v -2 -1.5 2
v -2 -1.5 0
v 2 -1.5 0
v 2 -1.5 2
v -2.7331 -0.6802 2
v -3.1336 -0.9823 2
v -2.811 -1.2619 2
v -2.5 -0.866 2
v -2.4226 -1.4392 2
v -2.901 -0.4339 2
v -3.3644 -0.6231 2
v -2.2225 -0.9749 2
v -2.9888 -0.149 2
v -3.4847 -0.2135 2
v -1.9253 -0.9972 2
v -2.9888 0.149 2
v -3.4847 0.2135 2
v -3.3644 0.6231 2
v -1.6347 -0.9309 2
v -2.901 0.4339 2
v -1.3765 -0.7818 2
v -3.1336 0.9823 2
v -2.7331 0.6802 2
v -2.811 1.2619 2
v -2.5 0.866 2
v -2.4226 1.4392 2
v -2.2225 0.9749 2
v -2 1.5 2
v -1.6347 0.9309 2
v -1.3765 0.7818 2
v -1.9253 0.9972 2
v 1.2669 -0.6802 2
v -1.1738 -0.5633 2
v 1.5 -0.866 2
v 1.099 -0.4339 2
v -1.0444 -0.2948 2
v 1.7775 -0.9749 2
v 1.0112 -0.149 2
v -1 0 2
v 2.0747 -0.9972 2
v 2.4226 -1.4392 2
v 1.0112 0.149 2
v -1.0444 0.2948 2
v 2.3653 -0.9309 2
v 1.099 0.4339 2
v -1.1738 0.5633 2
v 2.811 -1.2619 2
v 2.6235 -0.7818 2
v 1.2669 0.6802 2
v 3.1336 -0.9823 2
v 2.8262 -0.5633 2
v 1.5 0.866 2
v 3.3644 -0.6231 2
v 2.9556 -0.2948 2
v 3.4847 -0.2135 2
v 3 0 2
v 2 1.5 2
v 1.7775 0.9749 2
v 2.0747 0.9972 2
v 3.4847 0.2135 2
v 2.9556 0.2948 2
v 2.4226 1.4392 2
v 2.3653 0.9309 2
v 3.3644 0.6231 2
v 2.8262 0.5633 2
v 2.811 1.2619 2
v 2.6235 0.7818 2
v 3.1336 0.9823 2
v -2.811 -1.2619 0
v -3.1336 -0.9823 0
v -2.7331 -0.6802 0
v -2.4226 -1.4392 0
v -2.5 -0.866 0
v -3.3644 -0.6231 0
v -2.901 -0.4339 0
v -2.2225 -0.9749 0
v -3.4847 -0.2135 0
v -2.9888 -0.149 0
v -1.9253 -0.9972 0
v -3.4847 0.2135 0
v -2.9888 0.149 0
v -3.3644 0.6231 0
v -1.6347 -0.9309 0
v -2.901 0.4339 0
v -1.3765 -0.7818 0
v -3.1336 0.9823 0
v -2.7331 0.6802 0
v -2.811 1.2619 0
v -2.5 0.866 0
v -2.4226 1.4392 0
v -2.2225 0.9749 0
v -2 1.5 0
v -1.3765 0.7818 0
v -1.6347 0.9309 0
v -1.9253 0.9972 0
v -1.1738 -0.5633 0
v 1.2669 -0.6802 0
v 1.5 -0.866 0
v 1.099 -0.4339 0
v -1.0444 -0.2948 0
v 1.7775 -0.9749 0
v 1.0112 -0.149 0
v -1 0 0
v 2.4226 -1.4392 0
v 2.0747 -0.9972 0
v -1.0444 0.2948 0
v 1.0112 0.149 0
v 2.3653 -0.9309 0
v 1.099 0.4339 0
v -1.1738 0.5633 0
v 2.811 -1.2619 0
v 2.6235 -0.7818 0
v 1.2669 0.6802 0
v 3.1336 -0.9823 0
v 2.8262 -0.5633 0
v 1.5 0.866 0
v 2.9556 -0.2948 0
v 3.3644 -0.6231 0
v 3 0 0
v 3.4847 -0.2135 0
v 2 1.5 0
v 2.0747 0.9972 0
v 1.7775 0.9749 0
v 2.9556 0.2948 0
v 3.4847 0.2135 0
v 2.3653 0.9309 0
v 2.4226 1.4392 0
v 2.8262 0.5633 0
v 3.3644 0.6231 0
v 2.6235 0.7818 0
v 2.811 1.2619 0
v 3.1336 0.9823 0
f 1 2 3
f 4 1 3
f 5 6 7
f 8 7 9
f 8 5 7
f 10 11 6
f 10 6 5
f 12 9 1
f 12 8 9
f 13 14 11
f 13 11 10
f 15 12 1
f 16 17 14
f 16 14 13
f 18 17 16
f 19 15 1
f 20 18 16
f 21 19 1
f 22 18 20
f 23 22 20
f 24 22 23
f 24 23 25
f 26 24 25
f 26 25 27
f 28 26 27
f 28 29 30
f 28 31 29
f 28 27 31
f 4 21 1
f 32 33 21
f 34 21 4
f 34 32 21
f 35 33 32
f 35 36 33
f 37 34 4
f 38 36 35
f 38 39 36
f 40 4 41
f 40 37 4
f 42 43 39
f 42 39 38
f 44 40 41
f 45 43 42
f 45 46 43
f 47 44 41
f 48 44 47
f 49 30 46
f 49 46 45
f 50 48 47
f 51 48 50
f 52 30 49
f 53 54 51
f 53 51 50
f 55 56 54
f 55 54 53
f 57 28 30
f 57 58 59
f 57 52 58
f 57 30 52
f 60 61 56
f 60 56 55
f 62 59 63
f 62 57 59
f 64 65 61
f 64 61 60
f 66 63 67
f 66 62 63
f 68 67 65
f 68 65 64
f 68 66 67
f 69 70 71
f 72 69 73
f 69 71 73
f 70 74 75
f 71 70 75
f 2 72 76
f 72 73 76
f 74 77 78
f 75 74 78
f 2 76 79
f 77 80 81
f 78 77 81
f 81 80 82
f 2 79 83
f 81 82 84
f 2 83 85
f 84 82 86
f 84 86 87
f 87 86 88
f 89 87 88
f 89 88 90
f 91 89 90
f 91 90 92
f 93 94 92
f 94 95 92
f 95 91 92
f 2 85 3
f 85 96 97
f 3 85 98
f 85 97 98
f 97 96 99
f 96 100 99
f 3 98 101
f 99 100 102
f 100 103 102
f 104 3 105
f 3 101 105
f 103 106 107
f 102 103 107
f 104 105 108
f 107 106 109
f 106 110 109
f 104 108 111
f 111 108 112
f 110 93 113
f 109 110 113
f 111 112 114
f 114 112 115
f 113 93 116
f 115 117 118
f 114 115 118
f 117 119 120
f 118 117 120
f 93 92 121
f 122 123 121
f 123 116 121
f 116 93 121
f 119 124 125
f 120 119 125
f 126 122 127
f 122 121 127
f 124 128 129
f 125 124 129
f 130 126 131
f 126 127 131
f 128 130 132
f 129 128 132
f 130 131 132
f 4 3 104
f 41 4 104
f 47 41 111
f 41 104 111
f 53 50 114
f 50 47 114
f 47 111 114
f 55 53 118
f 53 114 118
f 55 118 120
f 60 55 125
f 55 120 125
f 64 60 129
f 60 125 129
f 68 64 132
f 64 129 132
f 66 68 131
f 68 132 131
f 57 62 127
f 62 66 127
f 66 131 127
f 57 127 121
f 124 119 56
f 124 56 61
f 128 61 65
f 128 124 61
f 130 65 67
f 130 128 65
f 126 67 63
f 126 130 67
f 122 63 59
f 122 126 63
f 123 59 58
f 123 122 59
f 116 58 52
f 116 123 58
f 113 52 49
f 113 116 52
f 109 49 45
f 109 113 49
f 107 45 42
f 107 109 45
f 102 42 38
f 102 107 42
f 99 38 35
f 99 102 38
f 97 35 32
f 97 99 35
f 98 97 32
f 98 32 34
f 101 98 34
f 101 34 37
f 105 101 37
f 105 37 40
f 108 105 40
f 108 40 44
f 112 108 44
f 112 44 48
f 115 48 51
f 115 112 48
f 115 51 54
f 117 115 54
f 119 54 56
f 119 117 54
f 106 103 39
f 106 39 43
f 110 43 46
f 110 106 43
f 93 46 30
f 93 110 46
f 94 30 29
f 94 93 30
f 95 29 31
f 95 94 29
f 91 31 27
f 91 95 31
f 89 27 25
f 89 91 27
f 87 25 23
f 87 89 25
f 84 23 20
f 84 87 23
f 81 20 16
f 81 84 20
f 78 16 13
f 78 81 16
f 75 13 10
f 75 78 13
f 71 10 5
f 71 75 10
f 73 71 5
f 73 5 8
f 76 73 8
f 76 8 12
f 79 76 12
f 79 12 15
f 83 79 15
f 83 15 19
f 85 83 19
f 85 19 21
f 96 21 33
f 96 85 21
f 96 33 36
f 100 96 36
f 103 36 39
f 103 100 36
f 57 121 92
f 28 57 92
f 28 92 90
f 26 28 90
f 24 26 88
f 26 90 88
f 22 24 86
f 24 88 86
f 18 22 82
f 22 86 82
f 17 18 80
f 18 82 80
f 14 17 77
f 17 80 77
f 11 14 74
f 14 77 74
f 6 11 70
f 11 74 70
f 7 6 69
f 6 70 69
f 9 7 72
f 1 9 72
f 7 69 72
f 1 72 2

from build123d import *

# Parameters (mm, degrees)
SKETCH1_R           = 1.5
SKETCH1_R_2         = 1
BOSS_EXTRUDE1_DEPTH = 2


with BuildPart() as part:
    # Sketch1 → Boss-Extrude1 (new body)
    # profile 1 of 3: a face of its own
    with BuildSketch(Plane.XY):
        with Locations((-2, 0)):
            Circle(SKETCH1_R)
        with Locations((-2, 0)):
            Circle(SKETCH1_R_2, mode=Mode.SUBTRACT)
    # profile 2 of 3: a face of its own
    with BuildSketch(Plane.XY):
        with BuildLine():
            ThreePointArc((-0.5, 0), (-0.939339828, -1.060660172), (-2, -1.5))
            Line((-2, -1.5), (2, -1.5))
            ThreePointArc((2, -1.5), (0.5, 0), (2, 1.5))
            Line((2, 1.5), (-2, 1.5))
            ThreePointArc((-2, 1.5), (-0.939339828, 1.060660172), (-0.5, 0))
        make_face()
    # profile 3 of 3: a face of its own
    with BuildSketch(Plane.XY):
        with Locations((2, 0)):
            Circle(SKETCH1_R)
        with Locations((2, 0)):
            Circle(SKETCH1_R_2, mode=Mode.SUBTRACT)
    extrude(amount=BOSS_EXTRUDE1_DEPTH)


solid = part.part
